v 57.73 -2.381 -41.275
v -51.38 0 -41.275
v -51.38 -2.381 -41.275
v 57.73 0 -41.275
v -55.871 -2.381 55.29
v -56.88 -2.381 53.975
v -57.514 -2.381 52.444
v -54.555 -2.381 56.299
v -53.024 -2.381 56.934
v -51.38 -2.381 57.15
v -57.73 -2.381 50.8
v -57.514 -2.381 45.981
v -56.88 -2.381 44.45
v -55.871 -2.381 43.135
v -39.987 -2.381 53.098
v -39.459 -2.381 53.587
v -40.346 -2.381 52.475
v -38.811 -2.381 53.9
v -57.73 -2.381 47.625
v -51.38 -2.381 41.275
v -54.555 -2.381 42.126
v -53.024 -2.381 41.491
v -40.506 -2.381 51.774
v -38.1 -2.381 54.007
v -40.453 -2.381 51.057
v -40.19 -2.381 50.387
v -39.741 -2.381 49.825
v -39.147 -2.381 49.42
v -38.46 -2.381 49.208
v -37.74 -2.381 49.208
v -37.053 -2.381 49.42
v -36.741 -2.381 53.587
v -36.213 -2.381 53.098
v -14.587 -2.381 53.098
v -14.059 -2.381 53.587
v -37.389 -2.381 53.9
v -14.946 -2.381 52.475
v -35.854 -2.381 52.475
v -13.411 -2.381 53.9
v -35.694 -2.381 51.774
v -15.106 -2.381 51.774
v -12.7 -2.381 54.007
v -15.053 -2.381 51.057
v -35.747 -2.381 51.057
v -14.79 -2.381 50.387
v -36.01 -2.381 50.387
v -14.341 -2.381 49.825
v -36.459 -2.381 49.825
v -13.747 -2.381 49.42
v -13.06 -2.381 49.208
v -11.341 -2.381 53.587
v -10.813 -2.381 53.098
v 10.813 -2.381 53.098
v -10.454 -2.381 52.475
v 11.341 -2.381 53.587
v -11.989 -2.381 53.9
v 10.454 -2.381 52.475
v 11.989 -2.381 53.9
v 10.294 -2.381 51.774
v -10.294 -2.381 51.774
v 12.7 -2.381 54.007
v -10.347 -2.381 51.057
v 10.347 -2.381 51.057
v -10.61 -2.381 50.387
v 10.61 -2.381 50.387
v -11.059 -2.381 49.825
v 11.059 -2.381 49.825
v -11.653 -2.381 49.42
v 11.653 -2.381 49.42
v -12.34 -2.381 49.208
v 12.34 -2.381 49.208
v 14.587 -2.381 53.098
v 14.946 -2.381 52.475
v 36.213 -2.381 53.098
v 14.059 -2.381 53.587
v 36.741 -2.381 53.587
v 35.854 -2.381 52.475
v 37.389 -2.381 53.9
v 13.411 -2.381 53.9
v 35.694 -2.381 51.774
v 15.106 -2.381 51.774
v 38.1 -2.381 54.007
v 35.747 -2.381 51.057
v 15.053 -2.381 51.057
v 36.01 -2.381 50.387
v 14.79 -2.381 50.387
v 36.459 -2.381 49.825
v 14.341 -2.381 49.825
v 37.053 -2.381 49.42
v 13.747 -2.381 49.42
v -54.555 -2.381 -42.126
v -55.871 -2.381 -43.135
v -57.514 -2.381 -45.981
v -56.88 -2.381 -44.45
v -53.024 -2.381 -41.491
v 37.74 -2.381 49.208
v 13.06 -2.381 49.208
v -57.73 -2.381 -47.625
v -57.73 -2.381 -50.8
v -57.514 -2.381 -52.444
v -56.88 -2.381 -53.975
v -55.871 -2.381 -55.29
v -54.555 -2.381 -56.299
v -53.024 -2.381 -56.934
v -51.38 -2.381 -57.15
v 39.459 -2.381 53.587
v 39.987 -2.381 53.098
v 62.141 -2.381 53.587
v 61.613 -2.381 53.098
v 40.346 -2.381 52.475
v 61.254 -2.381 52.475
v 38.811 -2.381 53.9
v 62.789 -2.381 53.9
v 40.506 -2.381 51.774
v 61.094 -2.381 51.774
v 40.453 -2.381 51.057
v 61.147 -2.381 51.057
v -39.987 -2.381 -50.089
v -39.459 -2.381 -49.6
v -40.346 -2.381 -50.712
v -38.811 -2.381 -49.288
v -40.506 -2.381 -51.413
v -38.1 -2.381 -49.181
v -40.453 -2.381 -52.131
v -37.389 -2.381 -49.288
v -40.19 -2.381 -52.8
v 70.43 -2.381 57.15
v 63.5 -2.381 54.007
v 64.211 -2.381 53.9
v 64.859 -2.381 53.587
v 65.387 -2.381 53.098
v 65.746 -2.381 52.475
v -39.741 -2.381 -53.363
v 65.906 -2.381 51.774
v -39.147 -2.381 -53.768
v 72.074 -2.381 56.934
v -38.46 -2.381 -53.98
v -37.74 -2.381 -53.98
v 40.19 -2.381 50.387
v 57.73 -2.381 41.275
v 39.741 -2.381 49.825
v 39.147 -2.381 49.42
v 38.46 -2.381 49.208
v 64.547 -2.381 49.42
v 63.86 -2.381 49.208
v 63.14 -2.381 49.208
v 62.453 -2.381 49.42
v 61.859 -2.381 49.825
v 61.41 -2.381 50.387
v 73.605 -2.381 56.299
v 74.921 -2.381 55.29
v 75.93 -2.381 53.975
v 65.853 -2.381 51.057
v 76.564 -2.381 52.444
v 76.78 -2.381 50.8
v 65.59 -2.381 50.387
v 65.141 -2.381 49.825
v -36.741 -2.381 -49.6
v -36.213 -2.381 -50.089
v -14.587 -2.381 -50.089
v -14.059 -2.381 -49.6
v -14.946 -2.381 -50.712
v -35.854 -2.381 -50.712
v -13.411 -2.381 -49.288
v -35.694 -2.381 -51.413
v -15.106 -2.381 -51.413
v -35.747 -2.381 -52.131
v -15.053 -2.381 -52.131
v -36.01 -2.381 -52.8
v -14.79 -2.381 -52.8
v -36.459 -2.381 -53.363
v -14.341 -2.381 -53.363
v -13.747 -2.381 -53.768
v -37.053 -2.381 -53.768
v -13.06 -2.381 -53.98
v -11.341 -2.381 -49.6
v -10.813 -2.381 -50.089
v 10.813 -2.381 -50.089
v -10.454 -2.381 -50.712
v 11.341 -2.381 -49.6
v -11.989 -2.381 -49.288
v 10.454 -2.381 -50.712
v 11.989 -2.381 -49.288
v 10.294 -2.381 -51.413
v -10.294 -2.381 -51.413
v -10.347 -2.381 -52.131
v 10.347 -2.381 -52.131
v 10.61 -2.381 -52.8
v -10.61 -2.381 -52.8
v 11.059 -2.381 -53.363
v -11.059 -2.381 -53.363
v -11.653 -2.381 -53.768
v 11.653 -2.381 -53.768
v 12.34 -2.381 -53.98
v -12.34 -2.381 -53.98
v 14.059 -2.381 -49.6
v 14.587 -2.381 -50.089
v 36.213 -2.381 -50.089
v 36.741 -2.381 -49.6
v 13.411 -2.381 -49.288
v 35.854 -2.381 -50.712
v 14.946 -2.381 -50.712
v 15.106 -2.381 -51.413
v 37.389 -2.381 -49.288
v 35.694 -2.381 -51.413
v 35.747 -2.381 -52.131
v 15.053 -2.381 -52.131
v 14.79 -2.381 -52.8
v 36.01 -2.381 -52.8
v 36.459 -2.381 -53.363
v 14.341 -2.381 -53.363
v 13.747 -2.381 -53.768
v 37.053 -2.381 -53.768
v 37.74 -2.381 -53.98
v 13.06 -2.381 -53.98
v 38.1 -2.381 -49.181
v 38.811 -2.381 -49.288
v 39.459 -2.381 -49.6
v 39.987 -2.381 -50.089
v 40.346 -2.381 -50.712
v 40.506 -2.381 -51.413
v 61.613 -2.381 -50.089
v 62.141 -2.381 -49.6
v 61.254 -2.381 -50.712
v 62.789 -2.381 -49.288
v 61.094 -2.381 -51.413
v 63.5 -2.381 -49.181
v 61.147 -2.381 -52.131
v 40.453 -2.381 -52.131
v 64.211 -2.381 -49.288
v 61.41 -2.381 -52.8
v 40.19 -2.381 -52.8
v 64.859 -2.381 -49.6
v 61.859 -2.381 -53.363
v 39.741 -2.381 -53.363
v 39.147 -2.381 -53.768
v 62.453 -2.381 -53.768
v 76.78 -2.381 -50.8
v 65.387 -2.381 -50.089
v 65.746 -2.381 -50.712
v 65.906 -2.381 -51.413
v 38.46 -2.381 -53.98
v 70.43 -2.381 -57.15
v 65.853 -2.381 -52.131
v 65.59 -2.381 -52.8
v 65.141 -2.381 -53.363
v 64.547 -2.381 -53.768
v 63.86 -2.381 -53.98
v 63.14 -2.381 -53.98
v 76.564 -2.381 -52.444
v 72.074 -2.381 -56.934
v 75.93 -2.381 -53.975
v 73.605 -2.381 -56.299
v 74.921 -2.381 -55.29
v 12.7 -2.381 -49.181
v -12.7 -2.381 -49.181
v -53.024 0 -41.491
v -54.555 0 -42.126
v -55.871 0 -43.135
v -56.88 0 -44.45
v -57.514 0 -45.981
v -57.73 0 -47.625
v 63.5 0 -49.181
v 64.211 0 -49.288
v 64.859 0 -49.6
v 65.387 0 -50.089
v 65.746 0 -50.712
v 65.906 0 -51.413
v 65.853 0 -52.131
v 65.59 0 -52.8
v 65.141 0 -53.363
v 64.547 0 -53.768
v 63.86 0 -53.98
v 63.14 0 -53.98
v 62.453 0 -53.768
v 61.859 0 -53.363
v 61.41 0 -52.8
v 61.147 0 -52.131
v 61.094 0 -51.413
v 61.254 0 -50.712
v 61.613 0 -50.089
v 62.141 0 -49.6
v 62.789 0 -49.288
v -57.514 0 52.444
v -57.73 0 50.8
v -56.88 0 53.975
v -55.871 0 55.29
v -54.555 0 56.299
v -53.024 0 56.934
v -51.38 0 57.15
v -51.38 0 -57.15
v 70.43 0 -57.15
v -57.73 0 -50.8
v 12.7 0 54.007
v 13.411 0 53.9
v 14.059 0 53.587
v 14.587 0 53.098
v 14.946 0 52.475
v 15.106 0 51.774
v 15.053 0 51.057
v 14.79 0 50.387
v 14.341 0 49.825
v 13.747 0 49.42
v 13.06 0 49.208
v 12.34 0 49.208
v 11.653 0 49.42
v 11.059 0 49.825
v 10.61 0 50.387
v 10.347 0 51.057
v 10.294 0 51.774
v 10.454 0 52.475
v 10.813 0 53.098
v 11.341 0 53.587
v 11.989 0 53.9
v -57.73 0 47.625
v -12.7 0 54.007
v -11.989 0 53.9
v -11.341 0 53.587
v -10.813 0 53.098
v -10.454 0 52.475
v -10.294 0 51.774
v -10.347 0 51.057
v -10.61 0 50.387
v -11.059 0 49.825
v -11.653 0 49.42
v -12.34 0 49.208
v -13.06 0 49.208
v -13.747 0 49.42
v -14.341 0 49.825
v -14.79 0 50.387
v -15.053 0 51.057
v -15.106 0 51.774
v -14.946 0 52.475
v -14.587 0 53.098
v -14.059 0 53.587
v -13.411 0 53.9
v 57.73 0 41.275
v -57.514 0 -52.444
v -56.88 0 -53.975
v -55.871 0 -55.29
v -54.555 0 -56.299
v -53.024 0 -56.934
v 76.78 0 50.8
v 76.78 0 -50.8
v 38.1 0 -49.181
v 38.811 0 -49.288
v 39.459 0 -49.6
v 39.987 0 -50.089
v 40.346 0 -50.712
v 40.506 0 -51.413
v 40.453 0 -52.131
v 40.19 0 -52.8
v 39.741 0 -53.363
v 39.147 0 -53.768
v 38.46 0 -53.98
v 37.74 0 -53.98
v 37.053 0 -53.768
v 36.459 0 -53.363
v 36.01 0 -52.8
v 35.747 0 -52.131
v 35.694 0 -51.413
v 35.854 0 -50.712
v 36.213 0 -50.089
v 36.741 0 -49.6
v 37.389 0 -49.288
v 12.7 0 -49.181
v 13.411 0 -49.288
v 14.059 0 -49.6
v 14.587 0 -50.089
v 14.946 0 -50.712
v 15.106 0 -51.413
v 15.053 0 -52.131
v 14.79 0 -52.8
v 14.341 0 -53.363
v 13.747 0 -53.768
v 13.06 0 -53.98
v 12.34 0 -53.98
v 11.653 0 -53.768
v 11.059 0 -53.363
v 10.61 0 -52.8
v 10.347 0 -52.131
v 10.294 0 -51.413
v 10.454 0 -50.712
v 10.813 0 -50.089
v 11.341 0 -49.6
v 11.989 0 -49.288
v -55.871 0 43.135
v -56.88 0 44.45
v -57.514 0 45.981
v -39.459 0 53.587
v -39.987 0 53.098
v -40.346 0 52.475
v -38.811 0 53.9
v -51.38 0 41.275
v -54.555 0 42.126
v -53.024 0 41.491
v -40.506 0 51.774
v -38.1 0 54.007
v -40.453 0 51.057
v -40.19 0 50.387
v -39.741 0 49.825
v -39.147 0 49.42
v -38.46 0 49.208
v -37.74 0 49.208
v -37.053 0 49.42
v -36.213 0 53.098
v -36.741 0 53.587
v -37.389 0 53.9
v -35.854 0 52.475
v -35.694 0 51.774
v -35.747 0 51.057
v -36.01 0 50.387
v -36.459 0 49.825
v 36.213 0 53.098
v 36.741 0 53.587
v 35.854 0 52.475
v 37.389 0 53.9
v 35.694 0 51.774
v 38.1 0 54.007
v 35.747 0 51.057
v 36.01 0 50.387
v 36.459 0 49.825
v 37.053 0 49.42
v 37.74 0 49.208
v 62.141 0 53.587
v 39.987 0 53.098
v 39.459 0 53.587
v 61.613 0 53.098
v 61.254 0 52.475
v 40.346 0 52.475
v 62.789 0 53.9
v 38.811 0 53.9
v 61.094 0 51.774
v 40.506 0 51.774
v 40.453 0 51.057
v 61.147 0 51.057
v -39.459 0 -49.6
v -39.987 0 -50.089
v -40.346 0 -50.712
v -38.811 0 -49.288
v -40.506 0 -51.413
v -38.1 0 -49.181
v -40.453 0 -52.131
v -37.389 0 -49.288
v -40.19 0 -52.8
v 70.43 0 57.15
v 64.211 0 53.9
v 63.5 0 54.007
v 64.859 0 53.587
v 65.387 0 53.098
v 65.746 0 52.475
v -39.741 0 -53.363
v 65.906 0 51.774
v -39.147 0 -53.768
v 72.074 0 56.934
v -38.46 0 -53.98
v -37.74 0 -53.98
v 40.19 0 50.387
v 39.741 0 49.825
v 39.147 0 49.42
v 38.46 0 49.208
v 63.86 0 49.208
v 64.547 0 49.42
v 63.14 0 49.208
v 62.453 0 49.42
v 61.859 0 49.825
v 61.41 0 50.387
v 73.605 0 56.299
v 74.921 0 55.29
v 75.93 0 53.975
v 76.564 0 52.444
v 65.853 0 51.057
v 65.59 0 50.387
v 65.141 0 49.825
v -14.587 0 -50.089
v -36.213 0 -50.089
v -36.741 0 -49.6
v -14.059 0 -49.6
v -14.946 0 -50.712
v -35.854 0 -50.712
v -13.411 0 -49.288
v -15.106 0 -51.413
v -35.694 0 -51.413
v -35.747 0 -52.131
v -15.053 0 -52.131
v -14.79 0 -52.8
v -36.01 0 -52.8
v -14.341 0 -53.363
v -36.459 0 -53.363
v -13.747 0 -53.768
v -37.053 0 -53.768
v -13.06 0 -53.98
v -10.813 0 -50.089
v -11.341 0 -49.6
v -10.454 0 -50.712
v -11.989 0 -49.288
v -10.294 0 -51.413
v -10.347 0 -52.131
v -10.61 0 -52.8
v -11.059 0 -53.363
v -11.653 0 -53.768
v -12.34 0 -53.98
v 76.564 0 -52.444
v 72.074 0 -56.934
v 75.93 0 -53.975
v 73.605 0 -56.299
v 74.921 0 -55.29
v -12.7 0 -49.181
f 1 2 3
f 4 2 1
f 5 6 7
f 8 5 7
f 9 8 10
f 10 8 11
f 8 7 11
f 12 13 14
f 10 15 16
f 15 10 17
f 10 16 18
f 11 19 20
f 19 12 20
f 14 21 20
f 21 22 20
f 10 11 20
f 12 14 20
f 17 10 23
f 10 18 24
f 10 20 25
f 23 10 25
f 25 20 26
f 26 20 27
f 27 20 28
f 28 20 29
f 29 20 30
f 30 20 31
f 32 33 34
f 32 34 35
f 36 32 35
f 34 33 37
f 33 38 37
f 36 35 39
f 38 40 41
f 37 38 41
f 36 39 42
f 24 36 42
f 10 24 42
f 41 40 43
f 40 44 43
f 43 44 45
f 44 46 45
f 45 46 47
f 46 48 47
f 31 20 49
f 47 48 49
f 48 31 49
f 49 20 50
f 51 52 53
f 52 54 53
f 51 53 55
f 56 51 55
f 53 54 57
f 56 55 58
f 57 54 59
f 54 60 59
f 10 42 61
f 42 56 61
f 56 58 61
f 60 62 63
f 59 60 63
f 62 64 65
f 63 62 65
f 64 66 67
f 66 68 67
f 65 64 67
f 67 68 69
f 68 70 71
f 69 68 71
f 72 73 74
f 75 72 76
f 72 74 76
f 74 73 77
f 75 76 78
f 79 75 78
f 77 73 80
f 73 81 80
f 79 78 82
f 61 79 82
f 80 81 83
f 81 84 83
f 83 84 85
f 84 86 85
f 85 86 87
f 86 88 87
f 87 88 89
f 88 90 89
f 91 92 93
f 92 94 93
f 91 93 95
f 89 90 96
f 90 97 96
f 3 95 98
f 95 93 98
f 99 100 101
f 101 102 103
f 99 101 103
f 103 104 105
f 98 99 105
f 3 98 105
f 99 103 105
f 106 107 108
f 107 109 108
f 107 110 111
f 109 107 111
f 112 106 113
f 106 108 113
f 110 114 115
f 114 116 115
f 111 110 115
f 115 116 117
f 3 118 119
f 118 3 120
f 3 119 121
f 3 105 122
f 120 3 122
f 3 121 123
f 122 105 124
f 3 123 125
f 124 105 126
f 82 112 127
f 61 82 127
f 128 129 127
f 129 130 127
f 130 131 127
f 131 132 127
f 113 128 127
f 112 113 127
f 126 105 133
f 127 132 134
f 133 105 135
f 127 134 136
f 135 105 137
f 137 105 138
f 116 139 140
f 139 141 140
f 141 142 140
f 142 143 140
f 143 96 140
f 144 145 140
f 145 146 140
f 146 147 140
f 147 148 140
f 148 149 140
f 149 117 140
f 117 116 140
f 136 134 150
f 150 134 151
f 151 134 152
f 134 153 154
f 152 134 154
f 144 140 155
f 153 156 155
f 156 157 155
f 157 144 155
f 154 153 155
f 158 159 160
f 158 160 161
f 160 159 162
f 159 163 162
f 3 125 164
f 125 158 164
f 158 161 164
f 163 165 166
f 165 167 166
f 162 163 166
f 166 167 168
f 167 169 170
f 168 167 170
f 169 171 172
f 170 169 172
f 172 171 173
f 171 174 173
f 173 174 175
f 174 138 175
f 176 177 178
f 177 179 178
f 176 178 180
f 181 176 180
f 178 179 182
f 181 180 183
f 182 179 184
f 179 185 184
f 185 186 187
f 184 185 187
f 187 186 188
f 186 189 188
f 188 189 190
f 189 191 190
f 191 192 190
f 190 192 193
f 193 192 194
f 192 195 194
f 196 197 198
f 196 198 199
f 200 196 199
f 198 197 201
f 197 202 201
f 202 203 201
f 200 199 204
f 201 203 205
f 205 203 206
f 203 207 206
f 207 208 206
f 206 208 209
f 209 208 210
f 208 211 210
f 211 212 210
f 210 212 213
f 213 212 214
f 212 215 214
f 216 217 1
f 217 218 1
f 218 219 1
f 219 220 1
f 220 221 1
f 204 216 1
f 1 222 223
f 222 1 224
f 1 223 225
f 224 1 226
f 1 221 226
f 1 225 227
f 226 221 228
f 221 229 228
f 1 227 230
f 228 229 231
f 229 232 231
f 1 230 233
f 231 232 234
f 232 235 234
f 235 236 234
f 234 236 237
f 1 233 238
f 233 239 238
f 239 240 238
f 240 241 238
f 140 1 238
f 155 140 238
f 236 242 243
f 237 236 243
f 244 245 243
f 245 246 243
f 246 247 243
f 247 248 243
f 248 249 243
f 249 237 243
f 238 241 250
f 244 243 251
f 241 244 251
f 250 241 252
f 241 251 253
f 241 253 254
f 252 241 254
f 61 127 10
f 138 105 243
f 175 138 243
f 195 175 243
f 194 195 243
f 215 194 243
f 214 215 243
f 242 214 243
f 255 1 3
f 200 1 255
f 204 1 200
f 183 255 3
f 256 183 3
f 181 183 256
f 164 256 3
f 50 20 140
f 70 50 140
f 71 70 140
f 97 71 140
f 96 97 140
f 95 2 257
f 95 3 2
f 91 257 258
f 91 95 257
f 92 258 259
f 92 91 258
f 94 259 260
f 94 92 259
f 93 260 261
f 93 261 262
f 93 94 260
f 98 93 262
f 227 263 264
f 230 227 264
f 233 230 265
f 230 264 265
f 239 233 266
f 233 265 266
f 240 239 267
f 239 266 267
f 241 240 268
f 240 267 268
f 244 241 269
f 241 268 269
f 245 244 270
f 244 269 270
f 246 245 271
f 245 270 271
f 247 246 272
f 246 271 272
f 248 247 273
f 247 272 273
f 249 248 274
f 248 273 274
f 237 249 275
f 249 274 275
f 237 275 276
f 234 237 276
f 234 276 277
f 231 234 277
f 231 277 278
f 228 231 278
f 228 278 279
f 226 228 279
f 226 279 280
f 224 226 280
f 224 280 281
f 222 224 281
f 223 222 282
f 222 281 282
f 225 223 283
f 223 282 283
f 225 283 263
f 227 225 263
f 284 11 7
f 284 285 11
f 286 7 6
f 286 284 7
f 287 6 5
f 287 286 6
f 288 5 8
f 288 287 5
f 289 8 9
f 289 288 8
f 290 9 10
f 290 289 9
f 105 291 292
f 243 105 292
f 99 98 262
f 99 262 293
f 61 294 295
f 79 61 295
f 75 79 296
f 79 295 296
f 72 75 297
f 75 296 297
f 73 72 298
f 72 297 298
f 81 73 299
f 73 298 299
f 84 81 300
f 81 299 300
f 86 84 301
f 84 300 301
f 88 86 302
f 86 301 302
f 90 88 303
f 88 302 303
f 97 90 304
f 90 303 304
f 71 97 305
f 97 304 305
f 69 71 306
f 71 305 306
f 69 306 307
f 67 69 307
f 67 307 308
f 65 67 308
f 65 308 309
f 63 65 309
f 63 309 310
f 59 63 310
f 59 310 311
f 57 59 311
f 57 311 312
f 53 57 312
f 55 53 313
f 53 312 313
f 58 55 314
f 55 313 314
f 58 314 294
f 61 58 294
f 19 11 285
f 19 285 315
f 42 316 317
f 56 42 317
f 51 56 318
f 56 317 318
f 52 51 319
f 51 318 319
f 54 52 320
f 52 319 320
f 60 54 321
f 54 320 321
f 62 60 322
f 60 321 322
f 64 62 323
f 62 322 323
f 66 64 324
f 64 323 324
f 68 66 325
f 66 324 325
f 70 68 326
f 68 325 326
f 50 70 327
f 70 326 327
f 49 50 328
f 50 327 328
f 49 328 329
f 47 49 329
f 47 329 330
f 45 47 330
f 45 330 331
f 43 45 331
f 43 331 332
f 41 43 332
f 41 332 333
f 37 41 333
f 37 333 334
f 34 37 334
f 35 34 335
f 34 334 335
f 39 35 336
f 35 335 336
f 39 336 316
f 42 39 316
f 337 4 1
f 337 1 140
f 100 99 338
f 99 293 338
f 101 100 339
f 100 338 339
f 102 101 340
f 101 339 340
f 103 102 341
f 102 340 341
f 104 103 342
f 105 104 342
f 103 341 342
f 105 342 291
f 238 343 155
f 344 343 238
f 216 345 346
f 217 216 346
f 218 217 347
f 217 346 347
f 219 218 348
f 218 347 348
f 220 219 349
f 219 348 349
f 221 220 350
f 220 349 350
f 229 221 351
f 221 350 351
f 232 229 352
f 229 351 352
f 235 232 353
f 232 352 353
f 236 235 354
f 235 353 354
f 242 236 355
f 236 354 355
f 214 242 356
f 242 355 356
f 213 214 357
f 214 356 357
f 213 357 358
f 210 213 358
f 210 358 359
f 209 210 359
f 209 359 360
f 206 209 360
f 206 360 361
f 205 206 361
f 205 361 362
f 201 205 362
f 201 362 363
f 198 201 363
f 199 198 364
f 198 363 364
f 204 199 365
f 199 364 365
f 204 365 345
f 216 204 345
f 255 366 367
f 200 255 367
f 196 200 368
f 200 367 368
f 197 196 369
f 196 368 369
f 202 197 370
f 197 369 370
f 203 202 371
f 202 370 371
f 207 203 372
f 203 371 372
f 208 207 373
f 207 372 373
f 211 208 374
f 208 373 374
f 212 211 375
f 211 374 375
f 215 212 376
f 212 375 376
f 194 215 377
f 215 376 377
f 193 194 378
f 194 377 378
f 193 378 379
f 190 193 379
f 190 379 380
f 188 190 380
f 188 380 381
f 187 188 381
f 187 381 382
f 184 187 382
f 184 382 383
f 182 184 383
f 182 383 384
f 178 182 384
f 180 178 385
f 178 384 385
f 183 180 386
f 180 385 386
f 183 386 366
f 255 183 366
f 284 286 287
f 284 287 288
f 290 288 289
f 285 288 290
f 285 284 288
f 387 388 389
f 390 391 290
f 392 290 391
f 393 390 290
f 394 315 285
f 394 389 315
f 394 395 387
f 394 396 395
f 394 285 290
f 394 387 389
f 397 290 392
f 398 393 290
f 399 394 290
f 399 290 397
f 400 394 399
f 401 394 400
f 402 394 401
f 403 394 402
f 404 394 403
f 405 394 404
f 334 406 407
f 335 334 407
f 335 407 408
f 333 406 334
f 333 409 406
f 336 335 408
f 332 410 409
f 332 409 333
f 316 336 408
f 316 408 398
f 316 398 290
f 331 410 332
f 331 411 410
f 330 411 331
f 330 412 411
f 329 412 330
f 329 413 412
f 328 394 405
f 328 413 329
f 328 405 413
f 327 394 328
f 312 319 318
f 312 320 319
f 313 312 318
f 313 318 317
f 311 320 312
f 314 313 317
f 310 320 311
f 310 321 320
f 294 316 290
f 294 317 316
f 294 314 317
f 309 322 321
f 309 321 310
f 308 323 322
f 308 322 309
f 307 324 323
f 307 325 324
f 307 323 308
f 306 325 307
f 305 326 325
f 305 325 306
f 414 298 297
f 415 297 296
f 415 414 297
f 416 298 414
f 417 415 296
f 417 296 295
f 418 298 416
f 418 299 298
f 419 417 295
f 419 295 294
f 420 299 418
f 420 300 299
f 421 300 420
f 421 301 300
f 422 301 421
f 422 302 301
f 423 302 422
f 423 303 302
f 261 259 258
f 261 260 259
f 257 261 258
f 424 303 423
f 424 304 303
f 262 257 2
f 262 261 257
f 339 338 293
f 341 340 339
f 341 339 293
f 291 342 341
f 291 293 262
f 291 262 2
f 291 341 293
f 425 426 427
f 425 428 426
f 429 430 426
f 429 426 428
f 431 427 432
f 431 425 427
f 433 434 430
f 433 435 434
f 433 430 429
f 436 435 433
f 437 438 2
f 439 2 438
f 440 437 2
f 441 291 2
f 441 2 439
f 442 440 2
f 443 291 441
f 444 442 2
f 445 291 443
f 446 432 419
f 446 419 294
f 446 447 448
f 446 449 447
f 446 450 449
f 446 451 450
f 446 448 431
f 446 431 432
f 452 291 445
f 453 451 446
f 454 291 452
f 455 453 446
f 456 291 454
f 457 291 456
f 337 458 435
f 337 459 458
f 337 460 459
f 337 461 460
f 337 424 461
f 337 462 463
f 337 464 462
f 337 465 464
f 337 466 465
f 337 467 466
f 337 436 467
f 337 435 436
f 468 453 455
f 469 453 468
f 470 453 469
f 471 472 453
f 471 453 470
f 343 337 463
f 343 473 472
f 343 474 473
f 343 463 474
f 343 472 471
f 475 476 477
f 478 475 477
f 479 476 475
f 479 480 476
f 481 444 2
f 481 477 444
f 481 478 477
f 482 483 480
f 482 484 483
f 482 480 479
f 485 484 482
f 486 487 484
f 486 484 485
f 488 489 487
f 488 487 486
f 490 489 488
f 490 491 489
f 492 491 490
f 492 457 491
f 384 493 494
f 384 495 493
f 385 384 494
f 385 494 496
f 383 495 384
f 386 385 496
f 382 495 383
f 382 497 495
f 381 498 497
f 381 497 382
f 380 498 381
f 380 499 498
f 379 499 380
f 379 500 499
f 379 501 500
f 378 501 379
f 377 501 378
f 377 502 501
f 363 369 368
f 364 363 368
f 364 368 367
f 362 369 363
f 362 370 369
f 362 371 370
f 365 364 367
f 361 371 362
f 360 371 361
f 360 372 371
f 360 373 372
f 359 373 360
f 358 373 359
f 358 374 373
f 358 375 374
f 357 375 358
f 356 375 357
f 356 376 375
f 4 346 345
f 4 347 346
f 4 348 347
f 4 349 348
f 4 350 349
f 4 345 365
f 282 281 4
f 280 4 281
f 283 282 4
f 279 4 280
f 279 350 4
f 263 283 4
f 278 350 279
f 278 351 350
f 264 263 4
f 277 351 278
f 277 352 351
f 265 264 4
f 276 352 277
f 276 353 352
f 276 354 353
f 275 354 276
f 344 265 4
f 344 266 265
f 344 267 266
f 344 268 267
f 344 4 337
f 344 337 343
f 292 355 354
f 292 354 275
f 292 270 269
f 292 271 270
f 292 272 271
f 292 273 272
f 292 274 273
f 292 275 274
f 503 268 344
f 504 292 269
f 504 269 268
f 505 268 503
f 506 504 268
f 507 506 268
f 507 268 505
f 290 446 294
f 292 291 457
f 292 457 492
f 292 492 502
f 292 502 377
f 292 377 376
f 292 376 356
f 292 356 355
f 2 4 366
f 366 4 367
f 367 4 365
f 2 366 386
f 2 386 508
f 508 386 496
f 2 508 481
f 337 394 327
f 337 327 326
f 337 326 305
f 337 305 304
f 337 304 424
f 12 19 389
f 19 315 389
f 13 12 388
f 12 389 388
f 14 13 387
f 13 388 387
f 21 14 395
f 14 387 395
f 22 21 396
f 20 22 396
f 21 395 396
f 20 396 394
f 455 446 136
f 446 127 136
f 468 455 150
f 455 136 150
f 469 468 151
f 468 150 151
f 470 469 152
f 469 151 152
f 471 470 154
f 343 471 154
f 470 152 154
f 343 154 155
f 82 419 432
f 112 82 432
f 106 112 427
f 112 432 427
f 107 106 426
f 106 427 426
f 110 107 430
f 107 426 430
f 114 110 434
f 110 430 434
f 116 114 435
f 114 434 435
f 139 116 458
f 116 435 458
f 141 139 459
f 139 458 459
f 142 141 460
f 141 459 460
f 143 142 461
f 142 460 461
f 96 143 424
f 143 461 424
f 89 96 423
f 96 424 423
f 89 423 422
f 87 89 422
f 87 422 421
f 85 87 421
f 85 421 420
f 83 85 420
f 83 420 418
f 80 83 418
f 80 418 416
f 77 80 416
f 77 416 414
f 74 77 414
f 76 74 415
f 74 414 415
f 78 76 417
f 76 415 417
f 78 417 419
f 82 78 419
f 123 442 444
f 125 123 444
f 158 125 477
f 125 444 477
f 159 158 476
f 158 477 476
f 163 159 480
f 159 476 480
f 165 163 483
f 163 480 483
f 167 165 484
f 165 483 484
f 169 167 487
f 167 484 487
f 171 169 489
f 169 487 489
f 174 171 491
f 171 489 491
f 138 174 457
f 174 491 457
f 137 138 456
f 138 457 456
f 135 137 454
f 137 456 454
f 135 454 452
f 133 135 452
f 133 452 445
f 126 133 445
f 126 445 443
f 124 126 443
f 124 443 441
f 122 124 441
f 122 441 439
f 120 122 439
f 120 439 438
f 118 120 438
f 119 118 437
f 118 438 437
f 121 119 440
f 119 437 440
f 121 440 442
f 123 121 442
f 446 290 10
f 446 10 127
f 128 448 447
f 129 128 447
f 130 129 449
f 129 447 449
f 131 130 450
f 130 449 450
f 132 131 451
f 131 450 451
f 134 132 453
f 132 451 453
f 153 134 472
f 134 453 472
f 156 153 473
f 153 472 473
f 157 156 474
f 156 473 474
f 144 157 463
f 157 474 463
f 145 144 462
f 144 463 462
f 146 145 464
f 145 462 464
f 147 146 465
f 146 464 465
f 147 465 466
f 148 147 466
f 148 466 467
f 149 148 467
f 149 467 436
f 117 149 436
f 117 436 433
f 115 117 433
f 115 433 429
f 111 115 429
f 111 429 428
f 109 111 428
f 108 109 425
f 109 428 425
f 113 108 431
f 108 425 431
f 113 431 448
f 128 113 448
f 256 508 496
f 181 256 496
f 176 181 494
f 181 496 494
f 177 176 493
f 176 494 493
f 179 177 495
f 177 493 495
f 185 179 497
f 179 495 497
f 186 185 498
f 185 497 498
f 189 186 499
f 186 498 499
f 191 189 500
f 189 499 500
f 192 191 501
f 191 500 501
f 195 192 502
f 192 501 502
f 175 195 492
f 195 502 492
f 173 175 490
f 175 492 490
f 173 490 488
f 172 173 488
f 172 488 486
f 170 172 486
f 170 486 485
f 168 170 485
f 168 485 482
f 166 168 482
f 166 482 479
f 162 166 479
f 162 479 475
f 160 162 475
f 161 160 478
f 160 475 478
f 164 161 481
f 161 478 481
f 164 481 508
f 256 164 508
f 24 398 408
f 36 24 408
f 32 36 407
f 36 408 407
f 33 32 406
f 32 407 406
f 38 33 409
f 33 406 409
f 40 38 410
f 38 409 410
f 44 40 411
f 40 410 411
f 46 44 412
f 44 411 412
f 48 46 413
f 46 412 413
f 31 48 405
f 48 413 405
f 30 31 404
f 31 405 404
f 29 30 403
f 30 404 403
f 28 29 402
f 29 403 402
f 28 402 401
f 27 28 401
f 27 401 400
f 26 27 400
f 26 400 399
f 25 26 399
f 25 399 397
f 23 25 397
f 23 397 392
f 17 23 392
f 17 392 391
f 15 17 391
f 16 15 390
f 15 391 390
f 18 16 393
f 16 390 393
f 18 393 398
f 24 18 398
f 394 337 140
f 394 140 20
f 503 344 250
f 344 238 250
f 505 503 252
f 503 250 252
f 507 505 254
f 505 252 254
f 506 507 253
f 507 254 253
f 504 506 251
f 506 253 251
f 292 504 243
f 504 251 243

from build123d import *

# Parameters (mm, degrees)
SKETCH1_W          = 153.56078
SKETCH1_H          = 114.3
SKETCH1_R          = 2.413
BASE_FLANGE1_DEPTH = 2.38125
FILLET1_R          = 6.35
SKETCH7_W          = 19.05
SKETCH7_H          = 114.3
CUT_EXTRUDE2_DEPTH = 2.54
FILLET2_R          = 6.35


# Sheet-metal steps are written as plain solids
with BuildPart() as part:
    # Sketch1 → Base-Flange1 (new body)
    with BuildSketch(Plane(origin=(0, 0, 0), x_dir=(1, 0, 0), z_dir=(0, 1, 0))):
        Rectangle(SKETCH1_W, SKETCH1_H)
        with Locations(Location((-63.5, -51.59375, 0), (0, 0, 270))):
            Circle(SKETCH1_R, mode=Mode.SUBTRACT)
        with Locations(Location((-38.1, -51.59375, 0), (0, 0, 270))):
            Circle(SKETCH1_R, mode=Mode.SUBTRACT)
        with Locations(Location((-12.7, -51.59375, 0), (0, 0, 270))):
            Circle(SKETCH1_R, mode=Mode.SUBTRACT)
        with Locations(Location((12.7, -51.59375, 0), (0, 0, 270))):
            Circle(SKETCH1_R, mode=Mode.SUBTRACT)
        with Locations(Location((38.1, -51.59375, 0), (0, 0, 270))):
            Circle(SKETCH1_R, mode=Mode.SUBTRACT)
        with Locations(Location((63.5, -51.59375, 0), (0, 0, 270))):
            Circle(SKETCH1_R, mode=Mode.SUBTRACT)
        with Locations(Location((63.5, 51.59375, 0), (0, 0, 270))):
            Circle(SKETCH1_R, mode=Mode.SUBTRACT)
        with Locations(Location((38.1, 51.59375, 0), (0, 0, 270))):
            Circle(SKETCH1_R, mode=Mode.SUBTRACT)
        with Locations(Location((12.7, 51.59375, 0), (0, 0, 270))):
            Circle(SKETCH1_R, mode=Mode.SUBTRACT)
        with Locations(Location((-12.7, 51.59375, 0), (0, 0, 270))):
            Circle(SKETCH1_R, mode=Mode.SUBTRACT)
        with Locations(Location((-38.1, 51.59375, 0), (0, 0, 270))):
            Circle(SKETCH1_R, mode=Mode.SUBTRACT)
        with Locations(Location((-63.5, 51.59375, 0), (0, 0, 270))):
            Circle(SKETCH1_R, mode=Mode.SUBTRACT)
        Polygon((57.73039, -41.275), (-63.104482091, -41.275), (-63.104482091, 41.275), (21.327886111, 41.275), (57.73039, 41.275), (57.73039, 15.875), align=None, mode=Mode.SUBTRACT)
    extrude(amount=-BASE_FLANGE1_DEPTH)

    # Fillet1
    fillet1_edges = [part.edges().sort_by_distance(p)[0] for p in [
        (-76.78039, -1.190625, -57.15),
        (76.78039, -1.190625, -57.15),
        (76.78039, -1.190625, 57.15),
        (-76.78039, -1.190625, 57.15),
    ]]
    fillet(fillet1_edges, radius=FILLET1_R)

    # Sketch7 → Cut-Extrude2 (cut)
    with BuildSketch(Plane(origin=(0, -2.38125, 0), x_dir=(-1, 0, 0), z_dir=(0, -1, 0))):
        with Locations((67.25539, 0)):
            Rectangle(SKETCH7_W, SKETCH7_H)
    extrude(amount=-CUT_EXTRUDE2_DEPTH, mode=Mode.SUBTRACT)

    # Fillet2
    fillet2_edges = [part.edges().sort_by_distance(p)[0] for p in [
        (-57.73039, -1.190625, 41.275),
        (-57.73039, -1.190625, -41.275),
        (-57.73039, -1.190625, 57.15),
        (-57.73039, -1.190625, -57.15),
    ]]
    fillet(fillet2_edges, radius=FILLET2_R)


solid = part.part
